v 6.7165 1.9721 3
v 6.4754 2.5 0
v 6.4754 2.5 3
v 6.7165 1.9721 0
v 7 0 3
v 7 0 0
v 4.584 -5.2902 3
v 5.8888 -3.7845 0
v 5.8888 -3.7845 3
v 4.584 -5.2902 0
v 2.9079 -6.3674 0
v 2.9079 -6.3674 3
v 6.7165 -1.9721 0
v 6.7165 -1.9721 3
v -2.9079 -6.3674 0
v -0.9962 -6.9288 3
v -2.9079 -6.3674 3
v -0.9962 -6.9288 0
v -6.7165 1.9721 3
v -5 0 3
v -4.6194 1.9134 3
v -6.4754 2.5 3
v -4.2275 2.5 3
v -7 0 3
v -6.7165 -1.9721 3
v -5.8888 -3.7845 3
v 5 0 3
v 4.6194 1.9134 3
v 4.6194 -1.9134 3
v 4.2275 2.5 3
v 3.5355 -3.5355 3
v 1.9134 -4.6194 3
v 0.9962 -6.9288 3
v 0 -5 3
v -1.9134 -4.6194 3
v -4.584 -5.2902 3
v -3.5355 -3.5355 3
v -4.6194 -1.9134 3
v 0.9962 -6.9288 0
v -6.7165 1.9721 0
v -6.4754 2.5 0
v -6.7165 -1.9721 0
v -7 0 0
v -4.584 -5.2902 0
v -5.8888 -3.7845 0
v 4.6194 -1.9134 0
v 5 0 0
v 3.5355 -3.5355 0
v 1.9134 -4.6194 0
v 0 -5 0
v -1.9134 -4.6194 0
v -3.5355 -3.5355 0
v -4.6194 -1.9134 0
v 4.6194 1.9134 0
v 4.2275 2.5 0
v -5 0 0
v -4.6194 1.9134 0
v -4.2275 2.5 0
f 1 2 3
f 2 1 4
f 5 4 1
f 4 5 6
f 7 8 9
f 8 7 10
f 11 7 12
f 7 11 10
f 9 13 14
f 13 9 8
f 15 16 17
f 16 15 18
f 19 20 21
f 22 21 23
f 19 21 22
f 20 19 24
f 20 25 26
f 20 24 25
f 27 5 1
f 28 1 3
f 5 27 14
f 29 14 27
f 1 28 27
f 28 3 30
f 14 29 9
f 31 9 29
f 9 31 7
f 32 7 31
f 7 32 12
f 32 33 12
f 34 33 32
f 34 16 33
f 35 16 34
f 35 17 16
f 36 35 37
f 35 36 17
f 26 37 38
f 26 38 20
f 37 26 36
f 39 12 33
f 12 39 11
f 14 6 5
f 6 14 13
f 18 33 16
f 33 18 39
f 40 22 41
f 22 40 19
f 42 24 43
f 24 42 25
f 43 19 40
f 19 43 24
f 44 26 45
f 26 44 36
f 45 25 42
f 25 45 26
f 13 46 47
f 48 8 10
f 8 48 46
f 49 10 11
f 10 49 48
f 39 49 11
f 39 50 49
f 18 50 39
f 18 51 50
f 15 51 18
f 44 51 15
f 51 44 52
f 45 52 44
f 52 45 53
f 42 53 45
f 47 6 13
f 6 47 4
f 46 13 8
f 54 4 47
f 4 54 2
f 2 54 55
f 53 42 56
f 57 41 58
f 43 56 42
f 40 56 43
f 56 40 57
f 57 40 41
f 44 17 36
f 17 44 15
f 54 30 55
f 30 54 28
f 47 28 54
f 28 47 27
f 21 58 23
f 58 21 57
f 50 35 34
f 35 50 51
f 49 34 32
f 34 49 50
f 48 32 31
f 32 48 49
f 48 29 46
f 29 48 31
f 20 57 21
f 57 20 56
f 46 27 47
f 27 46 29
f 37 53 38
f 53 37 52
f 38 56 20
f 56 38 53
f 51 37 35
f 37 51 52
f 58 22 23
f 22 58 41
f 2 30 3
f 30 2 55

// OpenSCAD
difference(){
cylinder(r=7,h=3);
cylinder(r=5,h=3);
translate([-7,2.5,0])cube([14,7,3]);
}
